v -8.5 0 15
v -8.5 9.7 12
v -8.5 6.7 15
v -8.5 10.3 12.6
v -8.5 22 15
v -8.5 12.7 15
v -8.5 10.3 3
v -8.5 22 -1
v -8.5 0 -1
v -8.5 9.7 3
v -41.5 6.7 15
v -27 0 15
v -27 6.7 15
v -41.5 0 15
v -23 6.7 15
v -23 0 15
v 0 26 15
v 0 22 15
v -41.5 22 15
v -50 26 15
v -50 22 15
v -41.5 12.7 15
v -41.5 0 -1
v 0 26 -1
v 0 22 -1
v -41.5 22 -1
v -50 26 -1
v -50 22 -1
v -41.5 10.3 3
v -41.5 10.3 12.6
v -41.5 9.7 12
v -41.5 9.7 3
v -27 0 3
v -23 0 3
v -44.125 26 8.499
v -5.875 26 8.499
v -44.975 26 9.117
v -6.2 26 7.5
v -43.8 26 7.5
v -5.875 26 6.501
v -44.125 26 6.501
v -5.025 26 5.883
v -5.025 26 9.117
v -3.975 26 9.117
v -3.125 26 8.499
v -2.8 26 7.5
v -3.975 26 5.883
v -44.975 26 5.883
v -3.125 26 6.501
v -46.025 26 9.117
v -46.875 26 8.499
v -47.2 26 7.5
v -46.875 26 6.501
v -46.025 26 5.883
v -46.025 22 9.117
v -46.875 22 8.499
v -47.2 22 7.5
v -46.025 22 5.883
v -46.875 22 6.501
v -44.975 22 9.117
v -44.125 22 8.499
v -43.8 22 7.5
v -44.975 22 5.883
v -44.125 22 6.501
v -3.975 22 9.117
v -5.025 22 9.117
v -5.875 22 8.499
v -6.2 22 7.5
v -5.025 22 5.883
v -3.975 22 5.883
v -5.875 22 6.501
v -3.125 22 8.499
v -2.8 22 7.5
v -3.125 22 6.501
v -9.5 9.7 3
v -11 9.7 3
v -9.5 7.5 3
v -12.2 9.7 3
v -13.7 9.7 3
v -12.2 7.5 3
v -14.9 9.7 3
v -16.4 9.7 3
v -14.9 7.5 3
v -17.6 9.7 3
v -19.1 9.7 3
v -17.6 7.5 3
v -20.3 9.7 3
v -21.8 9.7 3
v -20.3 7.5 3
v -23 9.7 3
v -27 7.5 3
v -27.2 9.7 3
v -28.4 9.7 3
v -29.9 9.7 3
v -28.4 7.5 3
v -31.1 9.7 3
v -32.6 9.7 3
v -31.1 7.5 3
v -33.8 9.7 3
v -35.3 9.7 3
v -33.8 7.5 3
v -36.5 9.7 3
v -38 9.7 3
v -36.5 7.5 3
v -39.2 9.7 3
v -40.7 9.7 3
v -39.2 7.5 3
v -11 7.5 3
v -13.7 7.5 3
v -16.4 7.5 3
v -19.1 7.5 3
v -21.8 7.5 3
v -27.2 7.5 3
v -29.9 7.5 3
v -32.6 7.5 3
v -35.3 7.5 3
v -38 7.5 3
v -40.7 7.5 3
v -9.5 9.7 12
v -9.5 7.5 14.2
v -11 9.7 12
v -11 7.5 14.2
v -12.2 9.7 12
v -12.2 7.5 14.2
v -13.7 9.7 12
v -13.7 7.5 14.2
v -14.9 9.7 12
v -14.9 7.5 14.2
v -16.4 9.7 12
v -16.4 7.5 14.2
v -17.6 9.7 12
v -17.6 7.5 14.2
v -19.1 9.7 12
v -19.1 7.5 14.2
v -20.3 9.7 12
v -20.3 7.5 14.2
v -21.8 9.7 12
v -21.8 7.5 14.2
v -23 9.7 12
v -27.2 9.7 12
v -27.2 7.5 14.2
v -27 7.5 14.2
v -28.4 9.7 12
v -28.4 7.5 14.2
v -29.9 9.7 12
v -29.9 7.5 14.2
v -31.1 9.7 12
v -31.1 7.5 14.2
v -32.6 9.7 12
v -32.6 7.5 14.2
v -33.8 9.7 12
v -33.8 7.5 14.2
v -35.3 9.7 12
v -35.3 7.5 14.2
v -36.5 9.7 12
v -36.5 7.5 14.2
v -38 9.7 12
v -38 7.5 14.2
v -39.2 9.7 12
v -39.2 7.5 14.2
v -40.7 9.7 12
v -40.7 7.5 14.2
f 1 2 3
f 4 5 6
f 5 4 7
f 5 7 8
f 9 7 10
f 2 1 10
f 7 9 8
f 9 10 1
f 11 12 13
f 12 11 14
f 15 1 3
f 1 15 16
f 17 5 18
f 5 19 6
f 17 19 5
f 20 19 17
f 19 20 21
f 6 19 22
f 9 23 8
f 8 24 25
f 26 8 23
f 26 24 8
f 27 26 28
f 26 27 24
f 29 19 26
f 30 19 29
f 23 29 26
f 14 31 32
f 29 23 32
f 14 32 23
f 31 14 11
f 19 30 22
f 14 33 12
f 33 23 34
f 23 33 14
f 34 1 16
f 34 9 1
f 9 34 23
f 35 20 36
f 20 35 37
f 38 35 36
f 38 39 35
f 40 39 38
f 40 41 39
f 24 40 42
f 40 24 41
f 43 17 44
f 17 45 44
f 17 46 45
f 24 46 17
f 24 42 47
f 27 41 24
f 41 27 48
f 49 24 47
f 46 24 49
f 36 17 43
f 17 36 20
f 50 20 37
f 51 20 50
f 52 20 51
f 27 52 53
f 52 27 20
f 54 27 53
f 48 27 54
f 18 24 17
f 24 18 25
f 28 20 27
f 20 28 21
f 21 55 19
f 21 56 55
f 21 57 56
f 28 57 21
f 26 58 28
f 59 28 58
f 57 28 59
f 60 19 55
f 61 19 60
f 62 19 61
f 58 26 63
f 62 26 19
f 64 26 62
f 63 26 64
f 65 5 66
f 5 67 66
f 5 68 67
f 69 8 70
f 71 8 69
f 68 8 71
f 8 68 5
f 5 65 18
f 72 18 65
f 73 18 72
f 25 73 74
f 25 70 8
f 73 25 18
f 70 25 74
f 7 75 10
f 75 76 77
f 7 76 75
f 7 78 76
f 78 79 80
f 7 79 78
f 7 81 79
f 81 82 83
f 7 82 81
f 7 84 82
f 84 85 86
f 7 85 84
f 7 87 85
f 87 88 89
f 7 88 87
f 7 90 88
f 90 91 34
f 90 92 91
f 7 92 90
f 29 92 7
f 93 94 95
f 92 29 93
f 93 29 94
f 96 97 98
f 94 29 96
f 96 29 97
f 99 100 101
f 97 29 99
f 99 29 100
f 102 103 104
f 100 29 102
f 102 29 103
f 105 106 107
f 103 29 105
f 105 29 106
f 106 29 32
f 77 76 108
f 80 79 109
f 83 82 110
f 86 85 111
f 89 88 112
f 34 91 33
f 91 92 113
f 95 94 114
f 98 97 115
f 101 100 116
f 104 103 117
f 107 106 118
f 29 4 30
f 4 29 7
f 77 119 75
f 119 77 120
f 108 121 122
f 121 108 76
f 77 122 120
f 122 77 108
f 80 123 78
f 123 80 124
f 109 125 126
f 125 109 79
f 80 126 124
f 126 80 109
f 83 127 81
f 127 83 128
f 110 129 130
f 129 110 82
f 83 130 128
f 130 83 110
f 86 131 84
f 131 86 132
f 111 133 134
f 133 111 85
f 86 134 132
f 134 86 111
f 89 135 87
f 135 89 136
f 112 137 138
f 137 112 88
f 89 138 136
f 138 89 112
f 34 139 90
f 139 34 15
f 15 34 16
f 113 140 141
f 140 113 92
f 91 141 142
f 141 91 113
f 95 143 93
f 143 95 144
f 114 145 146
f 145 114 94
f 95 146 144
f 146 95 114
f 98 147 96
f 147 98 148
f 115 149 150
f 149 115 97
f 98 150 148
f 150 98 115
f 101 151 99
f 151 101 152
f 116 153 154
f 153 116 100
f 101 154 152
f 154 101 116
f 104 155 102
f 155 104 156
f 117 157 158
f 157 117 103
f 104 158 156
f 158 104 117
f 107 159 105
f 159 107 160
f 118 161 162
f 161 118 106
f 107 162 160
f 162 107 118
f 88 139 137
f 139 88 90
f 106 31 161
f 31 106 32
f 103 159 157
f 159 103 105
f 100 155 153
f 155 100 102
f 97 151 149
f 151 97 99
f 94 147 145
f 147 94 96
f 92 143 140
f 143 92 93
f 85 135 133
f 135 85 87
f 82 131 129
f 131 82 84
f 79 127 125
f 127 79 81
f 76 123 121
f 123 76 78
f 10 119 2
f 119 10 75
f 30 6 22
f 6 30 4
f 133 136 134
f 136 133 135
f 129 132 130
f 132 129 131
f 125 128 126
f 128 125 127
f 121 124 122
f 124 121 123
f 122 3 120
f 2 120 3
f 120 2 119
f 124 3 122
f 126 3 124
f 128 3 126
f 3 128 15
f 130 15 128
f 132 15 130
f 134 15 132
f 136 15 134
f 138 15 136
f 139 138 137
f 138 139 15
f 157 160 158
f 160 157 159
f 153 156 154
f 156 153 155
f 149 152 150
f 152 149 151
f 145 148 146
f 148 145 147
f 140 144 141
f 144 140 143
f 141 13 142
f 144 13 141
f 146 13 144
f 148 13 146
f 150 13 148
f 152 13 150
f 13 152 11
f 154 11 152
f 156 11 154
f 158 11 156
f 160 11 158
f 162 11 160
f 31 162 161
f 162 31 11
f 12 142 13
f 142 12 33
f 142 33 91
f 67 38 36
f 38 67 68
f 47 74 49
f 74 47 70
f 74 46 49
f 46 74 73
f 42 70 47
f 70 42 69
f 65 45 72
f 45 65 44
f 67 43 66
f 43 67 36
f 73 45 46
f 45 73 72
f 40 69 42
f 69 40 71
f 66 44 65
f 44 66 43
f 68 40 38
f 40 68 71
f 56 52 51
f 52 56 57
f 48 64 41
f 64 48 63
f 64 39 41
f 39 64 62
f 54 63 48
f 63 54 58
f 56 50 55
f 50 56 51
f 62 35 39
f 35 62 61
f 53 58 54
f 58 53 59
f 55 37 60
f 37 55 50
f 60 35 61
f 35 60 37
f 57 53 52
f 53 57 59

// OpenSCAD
// file: inc/inc/functions.scad
// PRUSA iteration3
// Functions used in many files
// GNU GPL v3
// Josef Průša <josefprusa@me.com>
// Václav 'ax' Hůla <axtheb@gmail.com>
// Vlnofka <>
// http://www.reprap.org/wiki/Prusa_Mendel
// http://github.com/prusajr/PrusaMendel

module roundcorner(diameter){
	difference(){
		cube(size = [diameter,diameter,99], center = false);
		translate(v = [diameter, diameter, 0]) cylinder(h = 100, r=diameter, center=true);
	}
}
module nut(d,h,horizontal=true){
    cornerdiameter =  (d / 2) / cos (180 / 6);
    cylinder(h = h, r = cornerdiameter, $fn = 6);
    if(horizontal){
        for(i = [1:6]){
            rotate([0,0,60*i]) translate([-cornerdiameter-0.2,0,0]) rotate([0,0,-45]) cube([2,2,h]);
        }
    }
}

// Based on nophead research
module polyhole(d, h, center=false) {
    n = max(round(2 * d),3);
    rotate([0,0,180])
        cylinder(h = h, r = (d / 2) / cos (180 / n), $fn = n);
}

// make it interchangeable between this and cylinder
module cylinder_poly(r, h, center=false){
    polyhole(d=r*2, h=h, center=center);
}

module fillet(radius, height=100, $fn=0) {
    //this creates acutal fillet
    translate([-radius, -radius, -height/2-0.01])
        difference() {
            cube([radius*2, radius*2, height+0.02]);
            cylinder(r=radius, h=height+0.02, $fn=$fn);
        }
}

module cube_fillet(size, radius=-1, vertical=[3,3,3,3], top=[0,0,0,0], bottom=[0,0,0,0], center=false, $fn=0){
    //
    if (center) {
        cube_fillet_inside(size, radius, vertical, top, bottom, $fn);
    } else {
        translate([size[0]/2, size[1]/2, size[2]/2])
            cube_fillet_inside(size, radius, vertical, top, bottom, $fn);
    }
}

module cube_negative_fillet(size, radius=-1, vertical=[3,3,3,3], top=[0,0,0,0], bottom=[0,0,0,0], $fn=0){

    j=[1,0,1,0];

    for (i=[0:3]) {
        if (radius > -1) {
            rotate([0, 0, 90*i]) translate([size[1-j[i]]/2, size[j[i]]/2, 0]) fillet(radius, size[2], $fn=$fn);
        } else {
            rotate([0, 0, 90*i]) translate([size[1-j[i]]/2, size[j[i]]/2, 0]) fillet(vertical[i], size[2], $fn=$fn);
        }
        rotate([90*i, -90, 0]) translate([size[2]/2, size[j[i]]/2, 0 ]) fillet(top[i], size[1-j[i]], $fn=$fn);
        rotate([90*(4-i), 90, 0]) translate([size[2]/2, size[j[i]]/2, 0]) fillet(bottom[i], size[1-j[i]], $fn=$fn);

    }
}

module cube_fillet_inside(size, radius=-1, vertical=[3,3,3,3], top=[0,0,0,0], bottom=[0,0,0,0], $fn=0){
    //makes CENTERED cube with round corners
    // if you give it radius, it will fillet vertical corners.
    //othervise use vertical, top, bottom arrays
    //when viewed from top, it starts in upper right corner (+x,+y quadrant) , goes counterclockwise
    //top/bottom fillet starts in direction of Y axis and goes CCW too


    if (radius == 0) {
        cube(size, center=true);
    } else {
        difference() {
            cube(size, center=true);
            cube_negative_fillet(size, radius, vertical, top, bottom, $fn);
        }
    }
}


module nema17(places=[1,1,1,1], size=15.5, h=10, holes=false, shadow=false, $fn=24){
    for (i=[0:3]) {
        if (places[i] == 1) {
            rotate([0, 0, 90*i]) translate([size, size, 0]) {
                if (holes) {
                    #rotate([0, 0, -90*i])  translate([0,0,-10]) screw(r=1.7, slant=false, head_drop=13, $fn=$fn, h=h+12);
                } else {
                    rotate([0, 0, -90*i]) cylinder(h=h, r=5.5, $fn=$fn);
                }
            }
        }
    }
    if (shadow != false) {
        %translate ([0, 0, shadow+21+3]) cube([42,42,42], center = true);
    //flange
        %translate ([0, 0, shadow+21+3-21-1]) cylinder(r=11,h=2, center = true, $fn=20);
    //shaft
        %translate ([0, 0, shadow+21+3-21-7]) cylinder(r=2.5,h=14, center = true);
    }
}

module screw(h=20, r=2, r_head=3.5, head_drop=0, slant=true, poly=false, $fn=0){
    //makes screw with head
    //for substraction as screw hole
    if (poly) {
        cylinder_poly(h=h, r=r, $fn=$fn);
    } else {
        cylinder(h=h, r=r, $fn=$fn);
    }
    if (slant) {
        translate([0, 0, head_drop-0.01]) cylinder(h=r_head, r2=0, r1=r_head, $fn=$fn);
    }

    if (head_drop > 0) {
        translate([0, 0, -0.01]) cylinder(h=head_drop+0.01, r=r_head, $fn=$fn);
    }
}
module screw_cylinder(r_head=5.25,r=3.25,head_drop=6.2,slant=false){
	screw(r_head=r_head,head_drop=head_drop,r=r, slant=slant);

}

//screw_cylinder();
//cube_fillet([10,20,30], vertical=[3,2,0,0], top=[3,2,0,5], bottom=[3,2,0,5]);
//cube_fillet([10,20,30], radius=2, top=[7,2,7,2]);
// file: inc/conf_bushing.scad
// PRUSA iteration3
// Bushing and bering dimensions
// GNU GPL v3
// Václav 'ax' Hůla <axtheb@gmail.com>
// http://www.reprap.org/wiki/Prusa_Mendel
// http://github.com/josefprusa/Prusa3
//

// each config is in form[r_rod, r, h, type, name] where:
//     r_rod  is smooth rod radius [0]
//     r is outer bushing radius needed for tight fit or bearing radius with loose fit [1]
//     h is barrel length [2]
//     type is 0 for linear bearings, 1 is for bushings which needs to be enclosed fully. [3]
//       type 1 may have flange, but type 0 not
//     name is human readable name [4]

//bushings
conf_b_bushing8 = [4, 5.1, 10, 1, "Tube shaped bushing like igus J(V)FM 0810-10"];
conf_b_bushing10 = [5, 6.1, 10, 1, "Tube shaped bushing with id=10mm, od=12mm and length of at least 10mm, like J(V)FM 1012-10"];
conf_b_bushing12 = [6, 7.1, 15, 1, "Tube shaped bushing with id=12mm, od=14mm and length of at least 15mm, like SF-1 1215"];

conf_b_bronze8 = [4, 8, 11, 1, "bronze self-aligning bushing, 8mm"];

//shorter beaings (two on each Z axis)
conf_b_lm8uu = [4, 7.7, 24, 0, "lm8uu bearing (standard)"];
conf_b_lm10uu = [5, 9.7, 29, 0, "lm10uu bearing (10mm smooth rod)"];
conf_b_lme8uu =[4, 8.2, 25, 0, "lme8uu bearing"];
conf_b_lm12uu = [6, 10.6, 30, 0, "lm12uu bearing (12mm smooth rod)"];

//longer bearings
conf_b_lm8luu = [4, 7.7, 45, 0, "lm8luu bearing (double length)"];
conf_b_lm10luu = [5, 9.7, 55, 0, "lm10luu bearing (10mm smooth rod, long)"];
conf_b_lm12luu = [6, 10.6, 57, 0, "lm12luu bearing (12mm, double length)"];


// Select idler bearing size **************************************************
// [outer_diameter, width, inner_diameter, uses_guide]

// roughly sorted by desirability

// one bearing with guides
// Select by availability, smaller is better.
bearing_623 = [10, 4, 3, 1, "623 bearing"];
bearing_624 = [13, 5, 4, 1, "624 bearing"];
bearing_625 = [16, 5, 5, 1, "625 bearing"];

// two bearings side by side - for use without bearing guides.
// Not recomended anymore
bearing_625_double = [16, 10, 5, 0, "625 bearing x2"];
bearing_624_double = [13, 10, 4, 0, "624 bearing x2"];
bearing_623_double = [10, 8, 3, 0, "623 bearing"];

// 608 [standard skate bearings] with bearing guide
bearing_608 = [22, 7, 8, 1, "608 bearing"];
// 608 bearings with fender washers.
// the belt brushes both against the carriage and the washers.
bearing_608_washers = [22, 10, 8, 0, "608 bearing"];



// Select Z axis threaded rod size **************************************************
// [threaded_rod_diametar, threaded_rod_hole_r, nut_diameter, rod_trap_translate, rod_trap_cube_fillet ]

z_axis_threaded_rod_type_m5 = [5, 3, 4.6, [-12, 11, 0], [20, 14, 10]];
z_axis_threaded_rod_type_m8 = [8, 4.5, (14.38+0.5)/2, [-11, 9.3, 0], [20, 16, 10]];
// file: inc/metric.scad
// PRUSA iteration3
// Default metric sizes
// GNU GPL v3
// Josef Průša <josefprusa@me.com>
// http://www.reprap.org/wiki/Prusa_Mendel
// http://github.com/prusajr/PrusaMendel

// DONT CHANGE THIS FILE! ALTER VALUES IN CONFIGURATION.SCAD INSTEAD

// RODS

threaded_rod_diameter = 8.7;
threaded_rod_diameter_horizontal = 9;
smooth_bar_diameter = 8;
smooth_bar_diameter_horizontal = 8.5;
smooth_big_bar_diameter_horizontal = 10.8;

// Nuts and bolts


m8_diameter = 9;
//iso4032 says Width across corners = 14.38
m8_nut_diameter = 14.1;

m4_diameter = 4.7;
//iso4032 says 7.66
m4_nut_diameter = 7.6;
m4_nut_diameter_horizontal = 8.15;

m3_diameter = 3.4;
//iso4032 says 6.01
m3_nut_diameter = 5.3;
m3_nut_diameter_horizontal = 6.8;
m3_washer_diameter = 6.9;

// Motors

motor_shaft = 5.5;
// file: inc/configuration.scad
// PRUSA iteration3
// Configuration file
// GNU GPL v3
// Josef Průša <josefprusa@me.com>
// Václav 'ax' Hůla <axtheb@gmail.com>
// http://www.reprap.org/wiki/Prusa_Mendel
// http://github.com/prusajr/PrusaMendel

include <metric.scad>;
include <conf_bushing.scad>;

// Custom settings here, tailor to your supplies and print settings

layer_height = 0.3;
width_over_thickness = 2.2;

// Select your belt type ******************************************************

//T2.5
belt_tooth_distance = 2.5;
belt_tooth_ratio = 0.75;

//T5 (strongly discouraged)
//belt_tooth_distance = 5;
//belt_tooth_ratio = 0.75;

//HTD3
//belt_tooth_distance = 3;
//belt_tooth_ratio = 0.75;

//MXL
//belt_tooth_distance = 2.032;
//belt_tooth_ratio = 0.64;

//GT2 there is bunch of GT2 belts with different tooth-to-tooth distance
//adjust to your needs
//belt_tooth_distance = 2;
//belt_tooth_ratio = 0.5;

// For T type belts you will probably want 0.8mm or so.
belt_thickness = 1.75;

// Choose bearing/bushing configuration ***************************************
// conf_b_* are in inc/conf_bushing.scad

bushing_xy = conf_b_lm8uu;
bushing_z = conf_b_lm8uu;
// for longer bearings use one shorter in x-carriage to make place for belt attachment
// by default use same as xy
bushing_carriage = bushing_xy;

// Select idler bearing size **************************************************
// [outer_diameter, width, inner_diameter, uses_guide]
// 608 [standard skate bearings] with bearing guide
bearing_608 = [22, 7, 8, 1];
//608 bearings with fender washers. Not good at all, the belt brushes against the carriage
bearing_608_washers = [22, 10, 8, 0];
// one 625 with guides
bearing_625 = [16, 5, 5, 1];
// two 625 - for use without bearing guides.
bearing_625_double = [16, 10, 5, 0];

// those two here are really good:
bearing_624_double = [13, 9, 4, 0];
// this one has roughly same diameter as pulley, makes belt parallel so its prettier
bearing_623_double = [10, 8, 3, 0];

idler_bearing = bearing_608;

//Select carriage lenght
// 30 for single carriage extruder (two holes with centers 30mm apart)
// 50 for wade or single with fan (three holes, 30-20)
// 80 for full length carriage (four holes, 30-20-30)

carriage_l_base = 50;

// Fillets ********************************************************************
// mostly cosmetic, except z axis.
// 0 = no fillets
// 1 = fillet

use_fillets = 1;

//set to 0 for single plate (affects z axis and screws that attach RP parts tp frame)
i_am_box = 0;

//if you do your own plate and can move bottom Z screws 5mm up set this to 0 to
//get stronger motor mount. Only for i_am_box = 0
i_want_to_use_single_plate_dxf_and_make_my_z_weaker = 1;

//radius of long threaded rod on Y frame
//Use 5.4 for M10 or 4.4 for M8
y_threaded_rod_long_r = 4.4;

// Thickness of the XZ plate board. Leave at 12 for single plate
board_thickness = 12;

// END of custom settings


// You are not supposed to change this
board_to_xz_distance = 26;
xaxis_rod_distance = 45;

//calculated from settings
single_wall_width = width_over_thickness * layer_height;

idler_width = (idler_bearing[1] > 7 ? idler_bearing[1] : 7) + 2.5 * idler_bearing[3] ;

//deltas are used to enlarge parts for bigger bearings 
xy_delta = ((bushing_xy[1] <= 7.7) ? 0 : bushing_xy[1] - 7.7) * 0.9;
z_delta = (bushing_z[1] <= 7.7) ? 0 : bushing_z[1] - 7.7;

// CHANGE ONLY THE STUFF YOU KNOW
// IT WILL REPLACE DEFAULT SETTING

// RODS

// threaded_rod_diameter = 0;
// threaded_rod_diameter_horizontal = 0;
// smooth_bar_diameter = 0;
// smooth_bar_diameter_horizontal = 0;

// Nuts and bolts

// m8_diameter = 0;
// m8_nut_diameter = 0;

// m4_diameter = 0;
// m4_nut_diameter = 0;

// m3_diameter = 0;
// m3_nut_diameter = 0;

// Bushing holder

// bushing_core_diameter = smooth_bar_diameter;
// bushing_material_thickness = 0;

///counted stuff
m3_nut_diameter_bigger = ((m3_nut_diameter  / 2) / cos (180 / 6))*2;

// functions
include <inc/functions.scad>

// These constants define the geometry of the complete-printer.scad

//x_smooth_rod_length=325;
//y_smooth_rod_length=405;
//z_smooth_rod_length=235;
bed_x_size=225;
bed_y_size=225;

x_smooth_rod_length=460+board_thickness*2; // 492 for 16mm thickness; 484 for 12mm thickness
y_smooth_rod_length=470;
z_smooth_rod_length=405;
// main file
// PRUSA iteration3
// Y belt holder
// GNU GPL v3
// Josef Průša <iam@josefprusa.cz> and contributors
// http://www.reprap.org/wiki/Prusa_Mendel
// http://prusamendel.org

include <inc/configuration.scad>

module belt_holder_base(){
 translate([-33-8.5,0,-1]) cube([33,15,16]); 
 translate([-33-8.5,11,-1]) cube([33,15,16]);
 translate([-50,22,-1]) cube([50,4,16]);	
}

module belt_holder_beltcut(){
 position_tweak=-0.2;
 // Belt slit
 translate([-66,-0.3+10,3]) cube([67,0.6,15]);
 // Smooth insert cutout
 translate([-66,-0.3+10,12]) rotate([45,0,0]) cube([67,15,15]);
 // Individual teeth
 for ( i = [0 : 23] ){
  translate([0-i*2.7+position_tweak,-0.5+8,3]) cube([1.5,2.8,15]);
 }
 // Middle opening
 translate([-2-25,-1,3]) cube([4,11,15]);	
}

module belt_holder_holes(){
 for(offset = [0,41]){
 	translate([-4.5-offset,0,7.5]) rotate([-90,0,0]) cylinder(h=30, r=m3_diameter/2, $fn=10);
 }
}

// Final part
module belt_holder(){
 difference(){
  belt_holder_base();
  belt_holder_beltcut();
  belt_holder_holes();
 }
}

belt_holder();
